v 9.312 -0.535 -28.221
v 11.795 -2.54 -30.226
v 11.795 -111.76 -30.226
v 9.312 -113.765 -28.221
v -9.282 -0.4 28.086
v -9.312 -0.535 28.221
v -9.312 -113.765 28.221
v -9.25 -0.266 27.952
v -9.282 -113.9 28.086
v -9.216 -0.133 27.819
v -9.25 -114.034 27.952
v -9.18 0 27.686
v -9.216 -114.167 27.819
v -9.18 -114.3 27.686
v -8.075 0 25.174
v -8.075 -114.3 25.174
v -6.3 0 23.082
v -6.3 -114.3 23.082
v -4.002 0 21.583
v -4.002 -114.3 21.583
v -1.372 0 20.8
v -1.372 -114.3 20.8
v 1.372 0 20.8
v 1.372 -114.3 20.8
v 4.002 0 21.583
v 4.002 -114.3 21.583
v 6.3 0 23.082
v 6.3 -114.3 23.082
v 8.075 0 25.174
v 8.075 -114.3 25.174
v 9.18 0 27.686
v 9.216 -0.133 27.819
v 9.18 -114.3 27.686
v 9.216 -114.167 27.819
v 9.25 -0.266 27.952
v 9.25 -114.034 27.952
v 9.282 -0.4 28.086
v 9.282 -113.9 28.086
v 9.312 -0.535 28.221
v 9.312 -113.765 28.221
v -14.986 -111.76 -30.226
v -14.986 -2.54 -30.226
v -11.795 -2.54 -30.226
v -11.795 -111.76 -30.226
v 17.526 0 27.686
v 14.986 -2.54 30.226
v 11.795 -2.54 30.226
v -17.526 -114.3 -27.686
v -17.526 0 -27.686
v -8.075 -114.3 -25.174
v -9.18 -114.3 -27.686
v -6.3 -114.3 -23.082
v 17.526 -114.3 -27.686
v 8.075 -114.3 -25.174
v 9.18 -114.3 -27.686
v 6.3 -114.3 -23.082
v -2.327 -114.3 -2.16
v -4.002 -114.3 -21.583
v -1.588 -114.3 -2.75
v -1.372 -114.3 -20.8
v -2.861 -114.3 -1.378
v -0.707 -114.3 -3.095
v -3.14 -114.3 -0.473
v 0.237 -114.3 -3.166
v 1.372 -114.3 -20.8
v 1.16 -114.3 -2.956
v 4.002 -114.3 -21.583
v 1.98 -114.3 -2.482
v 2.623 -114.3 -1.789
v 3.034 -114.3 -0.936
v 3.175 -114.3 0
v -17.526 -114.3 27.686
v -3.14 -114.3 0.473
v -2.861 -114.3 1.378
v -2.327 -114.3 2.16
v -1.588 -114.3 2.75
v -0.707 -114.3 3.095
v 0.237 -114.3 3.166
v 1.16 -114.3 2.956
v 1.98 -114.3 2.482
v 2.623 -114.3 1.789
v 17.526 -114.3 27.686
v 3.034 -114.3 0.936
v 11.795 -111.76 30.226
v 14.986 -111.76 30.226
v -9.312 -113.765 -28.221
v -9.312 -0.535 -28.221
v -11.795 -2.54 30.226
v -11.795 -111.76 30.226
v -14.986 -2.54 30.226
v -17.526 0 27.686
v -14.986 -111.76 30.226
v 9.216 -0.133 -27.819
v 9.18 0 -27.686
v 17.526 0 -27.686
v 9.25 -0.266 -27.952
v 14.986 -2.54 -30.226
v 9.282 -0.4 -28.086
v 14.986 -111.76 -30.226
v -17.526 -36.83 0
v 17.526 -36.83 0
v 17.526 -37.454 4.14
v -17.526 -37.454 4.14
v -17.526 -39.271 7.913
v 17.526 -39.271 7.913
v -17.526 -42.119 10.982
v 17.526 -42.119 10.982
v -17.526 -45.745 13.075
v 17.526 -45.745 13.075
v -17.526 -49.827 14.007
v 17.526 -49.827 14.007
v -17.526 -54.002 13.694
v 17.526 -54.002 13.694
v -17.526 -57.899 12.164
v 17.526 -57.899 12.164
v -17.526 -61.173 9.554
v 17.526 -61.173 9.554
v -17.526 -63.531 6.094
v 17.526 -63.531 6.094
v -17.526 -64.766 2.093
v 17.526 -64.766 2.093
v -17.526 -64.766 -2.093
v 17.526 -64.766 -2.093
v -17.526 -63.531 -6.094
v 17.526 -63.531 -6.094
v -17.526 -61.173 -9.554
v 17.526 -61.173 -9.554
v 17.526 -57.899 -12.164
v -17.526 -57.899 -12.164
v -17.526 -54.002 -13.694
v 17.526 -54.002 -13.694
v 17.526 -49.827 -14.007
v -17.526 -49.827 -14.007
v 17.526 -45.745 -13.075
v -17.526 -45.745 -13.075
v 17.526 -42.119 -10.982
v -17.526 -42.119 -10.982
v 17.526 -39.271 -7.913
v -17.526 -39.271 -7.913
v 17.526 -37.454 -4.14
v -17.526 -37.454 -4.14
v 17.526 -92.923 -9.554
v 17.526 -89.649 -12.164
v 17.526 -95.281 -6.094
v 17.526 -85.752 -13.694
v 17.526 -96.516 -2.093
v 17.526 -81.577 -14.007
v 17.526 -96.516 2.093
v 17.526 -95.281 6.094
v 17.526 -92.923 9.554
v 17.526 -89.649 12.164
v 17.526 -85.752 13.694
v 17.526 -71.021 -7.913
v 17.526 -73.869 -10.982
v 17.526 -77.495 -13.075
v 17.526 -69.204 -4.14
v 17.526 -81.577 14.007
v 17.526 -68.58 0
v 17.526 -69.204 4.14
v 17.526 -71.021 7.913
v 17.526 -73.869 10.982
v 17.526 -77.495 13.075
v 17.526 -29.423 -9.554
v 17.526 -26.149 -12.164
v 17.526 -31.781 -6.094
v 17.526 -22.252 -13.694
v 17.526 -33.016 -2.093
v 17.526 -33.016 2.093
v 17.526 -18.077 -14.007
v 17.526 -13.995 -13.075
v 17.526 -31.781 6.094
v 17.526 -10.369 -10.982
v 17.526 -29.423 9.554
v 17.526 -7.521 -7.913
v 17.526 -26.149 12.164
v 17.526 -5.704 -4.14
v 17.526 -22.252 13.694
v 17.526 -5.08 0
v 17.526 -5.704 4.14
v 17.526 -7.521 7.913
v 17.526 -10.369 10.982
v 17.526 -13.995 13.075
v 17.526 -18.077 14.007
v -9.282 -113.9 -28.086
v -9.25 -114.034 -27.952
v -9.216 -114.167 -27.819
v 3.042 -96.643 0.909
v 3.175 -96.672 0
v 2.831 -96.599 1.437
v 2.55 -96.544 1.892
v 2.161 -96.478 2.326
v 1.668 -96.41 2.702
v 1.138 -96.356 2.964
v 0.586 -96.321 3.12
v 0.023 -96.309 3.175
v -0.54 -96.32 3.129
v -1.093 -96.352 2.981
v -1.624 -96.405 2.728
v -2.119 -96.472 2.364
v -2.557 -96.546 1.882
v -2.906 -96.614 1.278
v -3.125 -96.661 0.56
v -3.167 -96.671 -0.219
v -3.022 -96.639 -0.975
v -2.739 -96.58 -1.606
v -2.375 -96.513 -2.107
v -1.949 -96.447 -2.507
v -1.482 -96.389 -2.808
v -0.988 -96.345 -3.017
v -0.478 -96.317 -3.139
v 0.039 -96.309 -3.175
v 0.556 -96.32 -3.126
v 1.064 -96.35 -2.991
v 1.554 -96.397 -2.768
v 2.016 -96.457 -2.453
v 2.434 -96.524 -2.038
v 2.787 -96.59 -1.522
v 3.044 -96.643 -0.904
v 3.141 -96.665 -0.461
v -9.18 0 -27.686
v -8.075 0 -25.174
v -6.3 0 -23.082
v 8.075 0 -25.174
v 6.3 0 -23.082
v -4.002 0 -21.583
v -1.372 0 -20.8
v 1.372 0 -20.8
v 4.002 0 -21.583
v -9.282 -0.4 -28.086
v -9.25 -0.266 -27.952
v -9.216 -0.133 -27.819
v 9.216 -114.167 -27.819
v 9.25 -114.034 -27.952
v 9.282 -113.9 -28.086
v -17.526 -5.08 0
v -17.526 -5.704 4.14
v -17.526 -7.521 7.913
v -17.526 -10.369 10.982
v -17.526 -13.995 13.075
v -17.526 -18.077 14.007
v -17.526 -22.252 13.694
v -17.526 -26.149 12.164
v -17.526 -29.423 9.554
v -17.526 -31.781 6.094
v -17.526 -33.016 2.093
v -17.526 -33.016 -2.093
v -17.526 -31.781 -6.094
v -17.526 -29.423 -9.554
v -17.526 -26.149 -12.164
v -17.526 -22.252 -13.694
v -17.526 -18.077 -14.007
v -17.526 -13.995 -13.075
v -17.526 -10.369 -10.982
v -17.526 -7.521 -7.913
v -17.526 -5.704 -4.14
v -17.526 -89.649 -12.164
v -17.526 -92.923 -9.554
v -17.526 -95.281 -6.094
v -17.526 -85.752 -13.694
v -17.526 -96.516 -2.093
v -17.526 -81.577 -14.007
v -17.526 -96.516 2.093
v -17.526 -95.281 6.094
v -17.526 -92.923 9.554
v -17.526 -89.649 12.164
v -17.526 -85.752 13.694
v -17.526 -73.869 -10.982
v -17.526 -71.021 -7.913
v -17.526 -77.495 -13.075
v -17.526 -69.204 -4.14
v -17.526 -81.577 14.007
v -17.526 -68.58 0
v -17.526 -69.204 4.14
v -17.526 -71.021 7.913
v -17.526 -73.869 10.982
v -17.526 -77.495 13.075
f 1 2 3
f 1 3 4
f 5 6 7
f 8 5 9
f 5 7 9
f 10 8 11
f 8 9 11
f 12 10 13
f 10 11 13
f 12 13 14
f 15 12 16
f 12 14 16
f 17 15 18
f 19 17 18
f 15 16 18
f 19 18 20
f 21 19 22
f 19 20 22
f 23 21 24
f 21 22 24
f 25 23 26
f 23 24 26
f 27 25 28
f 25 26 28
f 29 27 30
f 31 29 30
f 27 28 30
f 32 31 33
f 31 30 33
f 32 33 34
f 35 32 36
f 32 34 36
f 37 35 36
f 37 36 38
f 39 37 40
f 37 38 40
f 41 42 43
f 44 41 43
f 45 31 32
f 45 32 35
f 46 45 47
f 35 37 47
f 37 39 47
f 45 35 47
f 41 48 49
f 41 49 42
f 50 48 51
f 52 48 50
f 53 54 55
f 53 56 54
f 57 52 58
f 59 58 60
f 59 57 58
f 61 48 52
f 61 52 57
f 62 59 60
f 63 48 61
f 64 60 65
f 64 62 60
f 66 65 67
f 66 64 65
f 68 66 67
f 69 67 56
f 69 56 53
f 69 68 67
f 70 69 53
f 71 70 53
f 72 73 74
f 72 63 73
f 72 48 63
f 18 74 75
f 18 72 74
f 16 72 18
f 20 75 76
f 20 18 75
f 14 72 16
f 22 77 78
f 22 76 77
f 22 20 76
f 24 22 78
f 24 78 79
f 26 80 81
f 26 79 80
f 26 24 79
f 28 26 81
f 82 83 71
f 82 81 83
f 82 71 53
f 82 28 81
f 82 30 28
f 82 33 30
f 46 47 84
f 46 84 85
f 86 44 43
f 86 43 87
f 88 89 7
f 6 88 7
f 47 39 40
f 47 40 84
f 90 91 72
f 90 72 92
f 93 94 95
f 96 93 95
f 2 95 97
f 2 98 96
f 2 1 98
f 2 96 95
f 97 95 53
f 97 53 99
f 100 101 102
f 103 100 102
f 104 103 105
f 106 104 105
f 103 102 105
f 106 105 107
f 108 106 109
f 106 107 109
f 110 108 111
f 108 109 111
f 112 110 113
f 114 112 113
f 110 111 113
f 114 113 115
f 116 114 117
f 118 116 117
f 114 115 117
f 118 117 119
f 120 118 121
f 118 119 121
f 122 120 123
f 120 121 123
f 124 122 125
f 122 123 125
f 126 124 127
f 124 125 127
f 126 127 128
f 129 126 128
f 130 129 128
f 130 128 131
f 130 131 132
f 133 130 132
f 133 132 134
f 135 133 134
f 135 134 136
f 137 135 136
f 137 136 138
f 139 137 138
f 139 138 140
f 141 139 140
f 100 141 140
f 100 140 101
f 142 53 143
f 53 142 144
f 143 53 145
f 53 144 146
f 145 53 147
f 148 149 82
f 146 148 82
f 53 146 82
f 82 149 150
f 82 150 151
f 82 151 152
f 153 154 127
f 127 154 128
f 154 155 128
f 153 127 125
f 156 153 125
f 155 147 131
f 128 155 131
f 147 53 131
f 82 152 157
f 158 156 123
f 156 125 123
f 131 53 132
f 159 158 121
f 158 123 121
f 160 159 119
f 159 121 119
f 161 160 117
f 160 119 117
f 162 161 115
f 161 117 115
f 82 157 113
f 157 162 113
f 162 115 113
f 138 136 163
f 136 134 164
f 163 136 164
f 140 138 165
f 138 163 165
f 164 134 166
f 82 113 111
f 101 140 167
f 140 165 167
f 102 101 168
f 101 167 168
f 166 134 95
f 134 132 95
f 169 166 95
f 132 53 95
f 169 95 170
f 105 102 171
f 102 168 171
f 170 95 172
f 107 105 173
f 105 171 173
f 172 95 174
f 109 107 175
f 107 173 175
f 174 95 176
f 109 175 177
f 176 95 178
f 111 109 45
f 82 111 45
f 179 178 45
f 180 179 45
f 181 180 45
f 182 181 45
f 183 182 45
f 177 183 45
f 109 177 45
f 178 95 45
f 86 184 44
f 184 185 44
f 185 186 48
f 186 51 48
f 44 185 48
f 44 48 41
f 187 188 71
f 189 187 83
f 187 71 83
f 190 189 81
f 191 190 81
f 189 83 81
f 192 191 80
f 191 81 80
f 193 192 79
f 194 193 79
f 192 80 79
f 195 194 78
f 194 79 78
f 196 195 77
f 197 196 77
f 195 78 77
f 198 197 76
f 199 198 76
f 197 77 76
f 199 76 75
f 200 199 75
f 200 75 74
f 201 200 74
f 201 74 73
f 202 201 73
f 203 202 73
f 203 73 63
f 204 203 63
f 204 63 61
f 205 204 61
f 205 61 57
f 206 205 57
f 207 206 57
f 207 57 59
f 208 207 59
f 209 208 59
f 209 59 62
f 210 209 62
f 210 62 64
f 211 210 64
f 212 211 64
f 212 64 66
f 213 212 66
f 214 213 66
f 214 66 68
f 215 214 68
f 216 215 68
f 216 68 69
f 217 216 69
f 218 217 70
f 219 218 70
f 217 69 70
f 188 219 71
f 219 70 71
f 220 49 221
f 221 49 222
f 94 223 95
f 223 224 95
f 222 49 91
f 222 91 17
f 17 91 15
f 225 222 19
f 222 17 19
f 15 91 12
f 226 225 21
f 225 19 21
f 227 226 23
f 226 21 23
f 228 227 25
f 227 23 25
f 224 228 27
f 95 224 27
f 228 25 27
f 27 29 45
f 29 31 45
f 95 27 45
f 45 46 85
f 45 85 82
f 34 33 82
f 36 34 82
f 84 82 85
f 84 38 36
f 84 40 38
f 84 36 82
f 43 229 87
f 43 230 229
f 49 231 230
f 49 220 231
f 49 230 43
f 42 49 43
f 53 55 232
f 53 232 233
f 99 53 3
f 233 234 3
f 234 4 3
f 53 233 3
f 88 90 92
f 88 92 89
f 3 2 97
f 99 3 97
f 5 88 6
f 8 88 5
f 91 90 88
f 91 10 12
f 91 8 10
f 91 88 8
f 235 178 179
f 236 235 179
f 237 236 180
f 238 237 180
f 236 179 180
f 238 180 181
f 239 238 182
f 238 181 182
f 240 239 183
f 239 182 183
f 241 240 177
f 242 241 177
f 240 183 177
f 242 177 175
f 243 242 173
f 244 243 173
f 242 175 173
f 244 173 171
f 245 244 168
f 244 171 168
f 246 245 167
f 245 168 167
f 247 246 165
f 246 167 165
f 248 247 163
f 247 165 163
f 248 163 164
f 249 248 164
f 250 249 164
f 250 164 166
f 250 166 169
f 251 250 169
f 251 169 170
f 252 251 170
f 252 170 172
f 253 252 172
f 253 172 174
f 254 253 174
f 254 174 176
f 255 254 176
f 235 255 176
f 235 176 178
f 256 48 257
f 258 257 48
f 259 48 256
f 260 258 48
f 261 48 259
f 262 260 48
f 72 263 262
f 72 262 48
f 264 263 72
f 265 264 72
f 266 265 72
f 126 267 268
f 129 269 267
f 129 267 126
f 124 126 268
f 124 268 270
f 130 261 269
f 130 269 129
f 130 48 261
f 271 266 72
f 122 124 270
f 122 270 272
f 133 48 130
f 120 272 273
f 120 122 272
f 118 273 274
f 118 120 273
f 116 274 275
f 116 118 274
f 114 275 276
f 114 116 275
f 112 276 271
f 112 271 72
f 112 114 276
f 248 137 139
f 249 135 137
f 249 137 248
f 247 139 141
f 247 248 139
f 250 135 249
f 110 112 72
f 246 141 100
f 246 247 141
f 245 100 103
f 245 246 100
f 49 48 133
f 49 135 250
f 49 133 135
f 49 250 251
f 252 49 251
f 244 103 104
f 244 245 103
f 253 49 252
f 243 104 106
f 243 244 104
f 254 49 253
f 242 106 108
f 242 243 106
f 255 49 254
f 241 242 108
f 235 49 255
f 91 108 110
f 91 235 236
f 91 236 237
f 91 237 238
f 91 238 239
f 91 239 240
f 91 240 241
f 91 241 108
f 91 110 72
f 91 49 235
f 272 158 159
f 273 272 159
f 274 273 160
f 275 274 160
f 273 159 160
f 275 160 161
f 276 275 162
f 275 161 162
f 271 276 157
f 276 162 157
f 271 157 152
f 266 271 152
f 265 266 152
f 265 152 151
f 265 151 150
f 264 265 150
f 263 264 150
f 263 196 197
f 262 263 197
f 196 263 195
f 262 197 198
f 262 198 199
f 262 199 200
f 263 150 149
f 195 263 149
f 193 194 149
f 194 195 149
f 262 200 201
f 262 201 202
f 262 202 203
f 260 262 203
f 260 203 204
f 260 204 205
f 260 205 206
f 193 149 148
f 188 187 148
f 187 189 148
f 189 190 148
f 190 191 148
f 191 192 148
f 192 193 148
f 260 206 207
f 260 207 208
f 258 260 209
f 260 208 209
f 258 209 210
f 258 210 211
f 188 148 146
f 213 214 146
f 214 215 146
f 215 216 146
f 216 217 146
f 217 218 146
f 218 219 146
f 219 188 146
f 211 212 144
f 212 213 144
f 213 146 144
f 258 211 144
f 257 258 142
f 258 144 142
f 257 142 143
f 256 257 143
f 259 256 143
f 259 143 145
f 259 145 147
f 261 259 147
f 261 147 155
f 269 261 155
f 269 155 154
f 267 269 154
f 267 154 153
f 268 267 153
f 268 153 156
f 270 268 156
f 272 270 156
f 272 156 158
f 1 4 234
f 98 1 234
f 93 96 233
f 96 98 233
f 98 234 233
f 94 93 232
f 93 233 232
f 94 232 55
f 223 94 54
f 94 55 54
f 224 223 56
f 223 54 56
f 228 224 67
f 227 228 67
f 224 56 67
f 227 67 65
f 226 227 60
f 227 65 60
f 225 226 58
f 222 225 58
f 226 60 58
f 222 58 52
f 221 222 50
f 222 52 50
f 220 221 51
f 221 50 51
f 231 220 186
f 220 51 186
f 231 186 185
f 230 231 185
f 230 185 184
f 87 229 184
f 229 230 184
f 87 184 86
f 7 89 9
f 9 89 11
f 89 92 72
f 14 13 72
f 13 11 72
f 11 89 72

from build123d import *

# Parameters (mm, degrees)
F0_W        = 35.052
F0_H        = 60.452
F1_DEPTH    = 114.3
F2_R        = 14.0462
F3_DEPTH    = 35.053
F4_R        = 3.175
F5_DEPTH    = 25.4
F6_R        = 9.525
F7_DEPTH    = 114.301
F8_T1_DEPTH = 21.0651495789
F8_T3_DEPTH = 127.3641495789
F8_T5_DEPTH = 126.047561274
F8_T7_DEPTH = 21.0651495789


# Not quite as in the source:
# - a fillet or chamfer that OpenCascade refuses, or shapes differently, is made with other operations: its cross-section is extruded or revolved along the edge and cut away or added


with BuildPart() as f1:
    # F0 (on Front) → F1 (new body)
    with BuildSketch(Plane.XZ):
        Rectangle(F0_W, F0_H)
    extrude(amount=F1_DEPTH)

    # F2 (on face) → F3 (cut, through all)
    with BuildSketch(Plane.YZ.offset(17.526)):
        with Locations((-19.1262, 0)):
            Circle(F2_R)
        with Locations((-50.8762, 0)):
            Circle(F2_R)
        with Locations((-82.6262, 0)):
            Circle(F2_R)
    extrude(amount=-F3_DEPTH, mode=Mode.SUBTRACT)

    # F4 (on face) → F5 (cut)
    with BuildSketch(Plane.XZ.offset(114.3)):
        Circle(F4_R)
    extrude(amount=-F5_DEPTH, mode=Mode.SUBTRACT)

    # F6 (on face) → F7 (cut, through all)
    with BuildSketch(Plane.XZ.offset(114.3)):
        with Locations((0, 30.226)):
            Circle(F6_R)
        with Locations((0, -30.226)):
            Circle(F6_R)
    extrude(amount=-F7_DEPTH, mode=Mode.SUBTRACT)

    # F8: chamfer of 2.54 on 16 edges, made by hand

    # F8_s2 → F8_t1 (cut)
    with BuildSketch(Plane.YZ.offset(-24.0580747894)):
        Polygon((-2.54, 30.226), (0, 27.686), (0, 30.226), align=None)
        Polygon((-111.76, 30.226), (-114.3, 27.686), (-114.3, 30.226), align=None)
        Polygon((0, -27.686), (-2.54, -30.226), (0, -30.226), align=None)
        Polygon((-114.3, -27.686), (-111.76, -30.226), (-114.3, -30.226), align=None)
    extrude(amount=F8_T1_DEPTH, mode=Mode.SUBTRACT)

    # F8_s4 → F8_t3 (cut)
    with BuildSketch(Plane.XZ.offset(-6.5320747894)):
        Polygon((-17.526, 27.686), (-14.986, 30.226), (-17.526, 30.226), align=None)
        Polygon((14.986, 30.226), (17.526, 27.686), (17.526, 30.226), align=None)
        Polygon((-17.526, -27.686), (-14.986, -30.226), (-17.526, -30.226), align=None)
        Polygon((17.526, -27.686), (14.986, -30.226), (17.526, -30.226), align=None)
    extrude(amount=F8_T3_DEPTH, mode=Mode.SUBTRACT)

    # F8_s6 → F8_t5 (cut)
    with BuildSketch(Plane.XZ.offset(-5.873780637)):
        with BuildLine():
            Line((-11.7946015193, 30.226), (-9.3115275153, 28.2207368421))
            ThreePointArc((-9.3115275153, 28.2207368421), (-9.4675743486, 29.181652858), (-9.525, 30.226))
            Line((-9.525, 30.226), (-11.7946015193, 30.226))
        make_face()
        with BuildLine():
            Line((9.3115275153, 28.2207368421), (11.7946015193, 30.226))
            Line((11.7946015193, 30.226), (9.525, 30.226))
            ThreePointArc((9.525, 30.226), (9.4675743486, 29.181652858), (9.3115275153, 28.2207368421))
        make_face()
        with BuildLine():
            Line((-11.7946015193, -30.226), (-9.3115275153, -28.2207368421))
            ThreePointArc((-9.3115275153, -28.2207368421), (-9.4675743486, -29.181652858), (-9.525, -30.226))
            Line((-9.525, -30.226), (-11.7946015193, -30.226))
        make_face()
        with BuildLine():
            Line((11.7946015193, -30.226), (9.3115275153, -28.2207368421))
            ThreePointArc((9.3115275153, -28.2207368421), (9.4675743486, -29.181652858), (9.525, -30.226))
            Line((9.525, -30.226), (11.7946015193, -30.226))
        make_face()
    extrude(amount=F8_T5_DEPTH, mode=Mode.SUBTRACT)

    # F8_s8 → F8_t7 (cut)
    with BuildSketch(Plane.YZ.offset(2.9929252106)):
        Polygon((0, 27.686), (-2.54, 30.226), (0, 30.226), align=None)
        Polygon((-114.3, 27.686), (-111.76, 30.226), (-114.3, 30.226), align=None)
        Polygon((0, -27.686), (-2.54, -30.226), (0, -30.226), align=None)
        Polygon((-114.3, -27.686), (-111.76, -30.226), (-114.3, -30.226), align=None)
    extrude(amount=F8_T7_DEPTH, mode=Mode.SUBTRACT)


solid = f1.part
